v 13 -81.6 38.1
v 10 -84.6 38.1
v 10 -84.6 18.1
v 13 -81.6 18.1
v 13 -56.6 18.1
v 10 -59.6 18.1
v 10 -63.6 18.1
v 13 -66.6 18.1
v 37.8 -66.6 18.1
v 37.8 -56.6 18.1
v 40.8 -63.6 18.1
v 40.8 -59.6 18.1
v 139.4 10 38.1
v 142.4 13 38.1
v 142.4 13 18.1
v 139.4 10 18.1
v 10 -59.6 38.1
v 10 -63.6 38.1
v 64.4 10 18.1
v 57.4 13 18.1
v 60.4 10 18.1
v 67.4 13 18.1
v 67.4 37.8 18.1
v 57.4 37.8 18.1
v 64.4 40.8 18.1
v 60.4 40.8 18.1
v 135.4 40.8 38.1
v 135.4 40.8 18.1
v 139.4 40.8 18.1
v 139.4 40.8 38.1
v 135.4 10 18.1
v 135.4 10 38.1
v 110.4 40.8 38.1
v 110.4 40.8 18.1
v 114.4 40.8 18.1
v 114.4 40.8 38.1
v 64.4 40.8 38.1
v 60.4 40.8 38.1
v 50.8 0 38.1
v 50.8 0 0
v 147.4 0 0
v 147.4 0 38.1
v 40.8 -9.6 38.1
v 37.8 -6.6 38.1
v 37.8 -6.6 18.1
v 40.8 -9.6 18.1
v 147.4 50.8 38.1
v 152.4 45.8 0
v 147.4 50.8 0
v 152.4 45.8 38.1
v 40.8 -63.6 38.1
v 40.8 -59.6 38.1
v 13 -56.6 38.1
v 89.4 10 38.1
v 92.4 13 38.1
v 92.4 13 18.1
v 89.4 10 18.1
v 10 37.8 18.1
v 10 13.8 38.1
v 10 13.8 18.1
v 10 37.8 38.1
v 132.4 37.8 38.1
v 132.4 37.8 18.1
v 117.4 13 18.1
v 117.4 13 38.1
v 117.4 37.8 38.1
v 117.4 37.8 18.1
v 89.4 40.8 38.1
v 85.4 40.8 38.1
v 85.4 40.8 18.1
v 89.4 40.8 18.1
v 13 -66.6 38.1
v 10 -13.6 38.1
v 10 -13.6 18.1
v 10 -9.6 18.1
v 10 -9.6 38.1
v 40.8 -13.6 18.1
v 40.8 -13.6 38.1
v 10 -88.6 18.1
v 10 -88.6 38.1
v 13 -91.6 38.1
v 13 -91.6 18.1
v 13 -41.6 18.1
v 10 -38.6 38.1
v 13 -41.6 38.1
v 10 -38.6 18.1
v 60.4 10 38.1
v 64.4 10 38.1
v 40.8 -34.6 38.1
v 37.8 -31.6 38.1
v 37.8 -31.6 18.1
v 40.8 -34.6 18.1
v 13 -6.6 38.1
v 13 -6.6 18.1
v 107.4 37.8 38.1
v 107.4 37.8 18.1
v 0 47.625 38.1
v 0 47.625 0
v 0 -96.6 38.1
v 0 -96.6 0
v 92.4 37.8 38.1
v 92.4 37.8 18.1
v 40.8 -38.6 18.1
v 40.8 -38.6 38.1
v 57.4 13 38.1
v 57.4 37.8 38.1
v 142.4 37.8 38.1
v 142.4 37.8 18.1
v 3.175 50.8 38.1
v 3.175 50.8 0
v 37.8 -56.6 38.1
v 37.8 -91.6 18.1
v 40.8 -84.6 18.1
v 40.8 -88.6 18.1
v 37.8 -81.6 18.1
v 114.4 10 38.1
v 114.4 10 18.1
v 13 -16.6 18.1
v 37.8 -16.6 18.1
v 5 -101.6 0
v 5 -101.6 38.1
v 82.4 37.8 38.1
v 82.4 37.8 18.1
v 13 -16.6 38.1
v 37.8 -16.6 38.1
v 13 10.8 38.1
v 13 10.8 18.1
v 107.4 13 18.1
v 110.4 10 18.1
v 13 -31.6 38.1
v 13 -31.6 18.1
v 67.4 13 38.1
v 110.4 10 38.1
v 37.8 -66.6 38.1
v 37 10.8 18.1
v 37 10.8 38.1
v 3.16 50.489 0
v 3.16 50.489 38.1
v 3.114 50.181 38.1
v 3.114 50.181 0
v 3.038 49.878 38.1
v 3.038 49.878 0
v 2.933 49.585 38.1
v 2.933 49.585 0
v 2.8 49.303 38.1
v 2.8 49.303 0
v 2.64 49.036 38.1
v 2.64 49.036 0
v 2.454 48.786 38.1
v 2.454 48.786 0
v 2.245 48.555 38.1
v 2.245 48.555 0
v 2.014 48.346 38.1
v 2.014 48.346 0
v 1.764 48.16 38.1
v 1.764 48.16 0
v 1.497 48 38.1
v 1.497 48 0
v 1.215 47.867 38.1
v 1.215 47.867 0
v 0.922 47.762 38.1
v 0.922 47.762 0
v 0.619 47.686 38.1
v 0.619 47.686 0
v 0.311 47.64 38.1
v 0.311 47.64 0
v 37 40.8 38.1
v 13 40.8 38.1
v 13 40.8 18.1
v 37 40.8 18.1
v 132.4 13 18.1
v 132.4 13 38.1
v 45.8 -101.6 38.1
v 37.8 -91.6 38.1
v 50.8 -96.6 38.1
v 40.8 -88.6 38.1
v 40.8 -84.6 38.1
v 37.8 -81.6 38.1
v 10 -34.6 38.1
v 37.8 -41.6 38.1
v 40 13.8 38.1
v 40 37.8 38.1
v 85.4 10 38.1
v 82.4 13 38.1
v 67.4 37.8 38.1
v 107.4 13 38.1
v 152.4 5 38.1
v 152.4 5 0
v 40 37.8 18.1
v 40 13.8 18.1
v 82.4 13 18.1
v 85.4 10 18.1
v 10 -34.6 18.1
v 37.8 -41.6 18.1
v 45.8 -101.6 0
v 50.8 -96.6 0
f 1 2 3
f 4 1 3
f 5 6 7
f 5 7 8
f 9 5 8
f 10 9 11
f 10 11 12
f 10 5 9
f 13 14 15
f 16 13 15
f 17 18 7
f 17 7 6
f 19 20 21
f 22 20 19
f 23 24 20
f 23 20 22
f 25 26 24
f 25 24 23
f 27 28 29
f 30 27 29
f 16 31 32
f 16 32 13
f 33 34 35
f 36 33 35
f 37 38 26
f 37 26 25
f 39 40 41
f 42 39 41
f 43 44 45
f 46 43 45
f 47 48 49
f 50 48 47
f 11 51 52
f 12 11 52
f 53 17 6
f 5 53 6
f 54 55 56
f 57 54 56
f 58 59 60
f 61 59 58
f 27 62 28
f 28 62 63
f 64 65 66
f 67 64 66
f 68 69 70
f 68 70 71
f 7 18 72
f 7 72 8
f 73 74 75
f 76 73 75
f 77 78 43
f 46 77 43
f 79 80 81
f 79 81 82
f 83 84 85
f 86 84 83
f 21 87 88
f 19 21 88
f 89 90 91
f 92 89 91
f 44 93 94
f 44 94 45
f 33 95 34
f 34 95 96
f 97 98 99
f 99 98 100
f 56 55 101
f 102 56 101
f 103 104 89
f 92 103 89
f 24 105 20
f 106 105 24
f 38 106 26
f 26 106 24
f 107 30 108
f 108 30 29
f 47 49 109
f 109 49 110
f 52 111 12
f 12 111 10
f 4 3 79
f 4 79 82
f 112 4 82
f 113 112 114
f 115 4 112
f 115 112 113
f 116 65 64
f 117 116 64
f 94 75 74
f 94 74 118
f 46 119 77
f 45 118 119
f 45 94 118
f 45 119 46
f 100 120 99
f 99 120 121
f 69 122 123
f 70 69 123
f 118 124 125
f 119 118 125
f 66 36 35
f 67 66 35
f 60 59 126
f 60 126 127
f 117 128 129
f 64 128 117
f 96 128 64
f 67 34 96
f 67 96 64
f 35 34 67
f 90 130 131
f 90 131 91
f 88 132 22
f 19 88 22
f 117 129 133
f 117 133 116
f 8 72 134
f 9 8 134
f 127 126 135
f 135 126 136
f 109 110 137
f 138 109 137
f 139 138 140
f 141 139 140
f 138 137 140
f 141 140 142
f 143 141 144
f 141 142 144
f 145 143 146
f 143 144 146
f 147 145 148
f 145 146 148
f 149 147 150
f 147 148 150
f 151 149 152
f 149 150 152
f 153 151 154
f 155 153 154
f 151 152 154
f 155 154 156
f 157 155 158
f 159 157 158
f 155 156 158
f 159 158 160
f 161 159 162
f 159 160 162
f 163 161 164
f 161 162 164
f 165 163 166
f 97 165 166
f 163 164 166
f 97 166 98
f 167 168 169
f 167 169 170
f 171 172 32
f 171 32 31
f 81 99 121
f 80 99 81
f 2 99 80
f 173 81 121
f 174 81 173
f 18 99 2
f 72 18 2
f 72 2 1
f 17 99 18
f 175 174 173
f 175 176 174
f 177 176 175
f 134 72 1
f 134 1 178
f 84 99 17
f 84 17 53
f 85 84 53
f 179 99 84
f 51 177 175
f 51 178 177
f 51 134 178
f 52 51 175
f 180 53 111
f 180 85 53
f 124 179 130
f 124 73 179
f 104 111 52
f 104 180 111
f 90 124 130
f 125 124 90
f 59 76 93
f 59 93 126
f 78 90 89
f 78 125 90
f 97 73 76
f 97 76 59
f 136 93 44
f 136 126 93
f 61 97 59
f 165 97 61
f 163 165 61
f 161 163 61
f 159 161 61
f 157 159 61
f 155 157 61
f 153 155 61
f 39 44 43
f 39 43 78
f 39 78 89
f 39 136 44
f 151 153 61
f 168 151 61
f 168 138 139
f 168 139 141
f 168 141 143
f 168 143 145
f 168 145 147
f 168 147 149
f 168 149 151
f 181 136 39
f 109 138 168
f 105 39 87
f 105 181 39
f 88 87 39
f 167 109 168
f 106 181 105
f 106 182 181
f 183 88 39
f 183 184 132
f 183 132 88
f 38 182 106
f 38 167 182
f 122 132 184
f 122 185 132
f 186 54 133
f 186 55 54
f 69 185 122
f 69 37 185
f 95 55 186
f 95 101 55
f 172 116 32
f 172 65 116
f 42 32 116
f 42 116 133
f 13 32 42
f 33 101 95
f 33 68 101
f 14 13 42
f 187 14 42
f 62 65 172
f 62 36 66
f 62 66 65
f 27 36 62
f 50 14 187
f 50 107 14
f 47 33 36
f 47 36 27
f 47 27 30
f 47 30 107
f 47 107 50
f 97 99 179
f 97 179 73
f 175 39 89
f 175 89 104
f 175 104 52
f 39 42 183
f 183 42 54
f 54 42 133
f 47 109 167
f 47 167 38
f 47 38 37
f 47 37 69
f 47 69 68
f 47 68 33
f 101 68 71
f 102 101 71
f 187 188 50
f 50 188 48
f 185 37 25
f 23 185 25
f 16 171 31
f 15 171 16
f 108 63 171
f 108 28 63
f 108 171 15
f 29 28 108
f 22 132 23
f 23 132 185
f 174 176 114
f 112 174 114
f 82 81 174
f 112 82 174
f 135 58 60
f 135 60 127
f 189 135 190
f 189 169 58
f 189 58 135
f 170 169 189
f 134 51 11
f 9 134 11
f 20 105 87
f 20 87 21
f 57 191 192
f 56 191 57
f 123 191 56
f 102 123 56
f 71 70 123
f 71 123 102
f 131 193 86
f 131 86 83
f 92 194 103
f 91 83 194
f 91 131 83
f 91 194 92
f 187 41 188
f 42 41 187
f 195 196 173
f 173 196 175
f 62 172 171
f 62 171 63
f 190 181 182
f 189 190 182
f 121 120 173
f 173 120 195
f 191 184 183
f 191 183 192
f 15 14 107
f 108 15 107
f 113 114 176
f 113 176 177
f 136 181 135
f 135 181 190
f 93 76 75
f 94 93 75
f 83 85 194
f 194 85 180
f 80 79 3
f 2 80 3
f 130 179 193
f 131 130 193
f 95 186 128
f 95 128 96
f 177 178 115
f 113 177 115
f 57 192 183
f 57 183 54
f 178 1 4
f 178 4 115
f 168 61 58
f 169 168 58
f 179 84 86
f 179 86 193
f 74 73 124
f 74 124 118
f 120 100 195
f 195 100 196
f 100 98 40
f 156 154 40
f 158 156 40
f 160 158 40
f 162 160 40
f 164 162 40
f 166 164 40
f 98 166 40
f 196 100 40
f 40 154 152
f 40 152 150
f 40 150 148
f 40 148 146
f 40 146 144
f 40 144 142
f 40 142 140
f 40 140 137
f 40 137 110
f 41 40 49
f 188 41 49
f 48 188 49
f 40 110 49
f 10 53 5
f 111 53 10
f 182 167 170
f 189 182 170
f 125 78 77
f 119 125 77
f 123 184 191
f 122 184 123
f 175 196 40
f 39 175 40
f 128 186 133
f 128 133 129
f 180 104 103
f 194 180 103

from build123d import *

# Parameters (mm, degrees)
F0_W     = 50.8
F0_H     = 101.6
F0_W_2   = 101.6
F0_H_2   = 50.8
F1_DEPTH = 38.1
F2_W     = 30.8
F2_H     = 10
F2_W_2   = 10
F2_H_2   = 30.8
F2_W_3   = 30
F2_H_3   = 30
F3_DEPTH = 20
F4_SIZE  = 3
F5_SIZE  = 5


with BuildPart() as f1:
    # F0 (on Top) → F1 (new body)
    with BuildSketch(Plane.XY):
        with BuildLine():
            Line((0, 47.625), (0, 0))
            Line((0, 0), (50.8, 0))
            Line((50.8, 0), (50.8, 50.8))
            Line((50.8, 50.8), (3.175, 50.8))
            ThreePointArc((3.175, 50.8), (2.245064, 48.554936), (0, 47.625))
        make_face()
        with Locations((25.4, -50.8)):
            Rectangle(F0_W, F0_H)
        with Locations((101.6, 25.4)):
            Rectangle(F0_W_2, F0_H_2)
    extrude(amount=F1_DEPTH)

    # F2 (on face) → F3 (cut)
    with BuildSketch(Plane.XY.offset(38.1)):
        with Locations((25.4, -86.6)):
            Rectangle(F2_W, F2_H)
        with Locations((25.4, -61.6)):
            Rectangle(F2_W, F2_H)
        with Locations((25.4, -36.6)):
            Rectangle(F2_W, F2_H)
        with Locations((25.4, -11.6)):
            Rectangle(F2_W, F2_H)
        with Locations((137.4, 25.4)):
            Rectangle(F2_W_2, F2_H_2)
        with Locations((112.4, 25.4)):
            Rectangle(F2_W_2, F2_H_2)
        with Locations((87.4, 25.4)):
            Rectangle(F2_W_2, F2_H_2)
        with Locations((62.4, 25.4)):
            Rectangle(F2_W_2, F2_H_2)
        with Locations((25, 25.8)):
            Rectangle(F2_W_3, F2_H_3)
    extrude(amount=-F3_DEPTH, mode=Mode.SUBTRACT)

    # F4
    f4_edges = [f1.edges().sort_by_distance(p)[0] for p in [
        (10, -6.6, 28.1),
        (10, 40.8, 28.1),
        (10, -31.6, 28.1),
        (10, -56.6, 28.1),
        (10, -81.6, 28.1),
        (10, -91.6, 28.1),
        (40.8, -81.6, 28.1),
        (40.8, -91.6, 28.1),
        (40.8, -66.6, 28.1),
        (40.8, -56.6, 28.1),
        (10, -66.6, 28.1),
        (10, -41.6, 28.1),
        (40.8, -31.6, 28.1),
        (40.8, -41.6, 28.1),
        (10, -16.6, 28.1),
        (40.8, -16.6, 28.1),
        (40.8, -6.6, 28.1),
        (10, 10.8, 28.1),
        (40, 40.8, 28.1),
        (40, 10.8, 28.1),
        (57.4, 40.8, 28.1),
        (57.4, 10, 28.1),
        (67.4, 10, 28.1),
        (67.4, 40.8, 28.1),
        (82.4, 40.8, 28.1),
        (82.4, 10, 28.1),
        (92.4, 40.8, 28.1),
        (92.4, 10, 28.1),
        (107.4, 10, 28.1),
        (117.4, 10, 28.1),
        (117.4, 40.8, 28.1),
        (107.4, 40.8, 28.1),
        (132.4, 10, 28.1),
        (142.4, 10, 28.1),
        (142.4, 40.8, 28.1),
        (132.4, 40.8, 28.1),
    ]]
    chamfer(f4_edges, length=F4_SIZE)

    # F5
    f5_edges = [f1.edges().sort_by_distance(p)[0] for p in [
        (0, -101.6, 19.05),
        (50.8, -101.6, 19.05),
        (152.4, 0, 19.05),
        (152.4, 50.8, 19.05),
    ]]
    chamfer(f5_edges, length=F5_SIZE)


solid = f1.part
